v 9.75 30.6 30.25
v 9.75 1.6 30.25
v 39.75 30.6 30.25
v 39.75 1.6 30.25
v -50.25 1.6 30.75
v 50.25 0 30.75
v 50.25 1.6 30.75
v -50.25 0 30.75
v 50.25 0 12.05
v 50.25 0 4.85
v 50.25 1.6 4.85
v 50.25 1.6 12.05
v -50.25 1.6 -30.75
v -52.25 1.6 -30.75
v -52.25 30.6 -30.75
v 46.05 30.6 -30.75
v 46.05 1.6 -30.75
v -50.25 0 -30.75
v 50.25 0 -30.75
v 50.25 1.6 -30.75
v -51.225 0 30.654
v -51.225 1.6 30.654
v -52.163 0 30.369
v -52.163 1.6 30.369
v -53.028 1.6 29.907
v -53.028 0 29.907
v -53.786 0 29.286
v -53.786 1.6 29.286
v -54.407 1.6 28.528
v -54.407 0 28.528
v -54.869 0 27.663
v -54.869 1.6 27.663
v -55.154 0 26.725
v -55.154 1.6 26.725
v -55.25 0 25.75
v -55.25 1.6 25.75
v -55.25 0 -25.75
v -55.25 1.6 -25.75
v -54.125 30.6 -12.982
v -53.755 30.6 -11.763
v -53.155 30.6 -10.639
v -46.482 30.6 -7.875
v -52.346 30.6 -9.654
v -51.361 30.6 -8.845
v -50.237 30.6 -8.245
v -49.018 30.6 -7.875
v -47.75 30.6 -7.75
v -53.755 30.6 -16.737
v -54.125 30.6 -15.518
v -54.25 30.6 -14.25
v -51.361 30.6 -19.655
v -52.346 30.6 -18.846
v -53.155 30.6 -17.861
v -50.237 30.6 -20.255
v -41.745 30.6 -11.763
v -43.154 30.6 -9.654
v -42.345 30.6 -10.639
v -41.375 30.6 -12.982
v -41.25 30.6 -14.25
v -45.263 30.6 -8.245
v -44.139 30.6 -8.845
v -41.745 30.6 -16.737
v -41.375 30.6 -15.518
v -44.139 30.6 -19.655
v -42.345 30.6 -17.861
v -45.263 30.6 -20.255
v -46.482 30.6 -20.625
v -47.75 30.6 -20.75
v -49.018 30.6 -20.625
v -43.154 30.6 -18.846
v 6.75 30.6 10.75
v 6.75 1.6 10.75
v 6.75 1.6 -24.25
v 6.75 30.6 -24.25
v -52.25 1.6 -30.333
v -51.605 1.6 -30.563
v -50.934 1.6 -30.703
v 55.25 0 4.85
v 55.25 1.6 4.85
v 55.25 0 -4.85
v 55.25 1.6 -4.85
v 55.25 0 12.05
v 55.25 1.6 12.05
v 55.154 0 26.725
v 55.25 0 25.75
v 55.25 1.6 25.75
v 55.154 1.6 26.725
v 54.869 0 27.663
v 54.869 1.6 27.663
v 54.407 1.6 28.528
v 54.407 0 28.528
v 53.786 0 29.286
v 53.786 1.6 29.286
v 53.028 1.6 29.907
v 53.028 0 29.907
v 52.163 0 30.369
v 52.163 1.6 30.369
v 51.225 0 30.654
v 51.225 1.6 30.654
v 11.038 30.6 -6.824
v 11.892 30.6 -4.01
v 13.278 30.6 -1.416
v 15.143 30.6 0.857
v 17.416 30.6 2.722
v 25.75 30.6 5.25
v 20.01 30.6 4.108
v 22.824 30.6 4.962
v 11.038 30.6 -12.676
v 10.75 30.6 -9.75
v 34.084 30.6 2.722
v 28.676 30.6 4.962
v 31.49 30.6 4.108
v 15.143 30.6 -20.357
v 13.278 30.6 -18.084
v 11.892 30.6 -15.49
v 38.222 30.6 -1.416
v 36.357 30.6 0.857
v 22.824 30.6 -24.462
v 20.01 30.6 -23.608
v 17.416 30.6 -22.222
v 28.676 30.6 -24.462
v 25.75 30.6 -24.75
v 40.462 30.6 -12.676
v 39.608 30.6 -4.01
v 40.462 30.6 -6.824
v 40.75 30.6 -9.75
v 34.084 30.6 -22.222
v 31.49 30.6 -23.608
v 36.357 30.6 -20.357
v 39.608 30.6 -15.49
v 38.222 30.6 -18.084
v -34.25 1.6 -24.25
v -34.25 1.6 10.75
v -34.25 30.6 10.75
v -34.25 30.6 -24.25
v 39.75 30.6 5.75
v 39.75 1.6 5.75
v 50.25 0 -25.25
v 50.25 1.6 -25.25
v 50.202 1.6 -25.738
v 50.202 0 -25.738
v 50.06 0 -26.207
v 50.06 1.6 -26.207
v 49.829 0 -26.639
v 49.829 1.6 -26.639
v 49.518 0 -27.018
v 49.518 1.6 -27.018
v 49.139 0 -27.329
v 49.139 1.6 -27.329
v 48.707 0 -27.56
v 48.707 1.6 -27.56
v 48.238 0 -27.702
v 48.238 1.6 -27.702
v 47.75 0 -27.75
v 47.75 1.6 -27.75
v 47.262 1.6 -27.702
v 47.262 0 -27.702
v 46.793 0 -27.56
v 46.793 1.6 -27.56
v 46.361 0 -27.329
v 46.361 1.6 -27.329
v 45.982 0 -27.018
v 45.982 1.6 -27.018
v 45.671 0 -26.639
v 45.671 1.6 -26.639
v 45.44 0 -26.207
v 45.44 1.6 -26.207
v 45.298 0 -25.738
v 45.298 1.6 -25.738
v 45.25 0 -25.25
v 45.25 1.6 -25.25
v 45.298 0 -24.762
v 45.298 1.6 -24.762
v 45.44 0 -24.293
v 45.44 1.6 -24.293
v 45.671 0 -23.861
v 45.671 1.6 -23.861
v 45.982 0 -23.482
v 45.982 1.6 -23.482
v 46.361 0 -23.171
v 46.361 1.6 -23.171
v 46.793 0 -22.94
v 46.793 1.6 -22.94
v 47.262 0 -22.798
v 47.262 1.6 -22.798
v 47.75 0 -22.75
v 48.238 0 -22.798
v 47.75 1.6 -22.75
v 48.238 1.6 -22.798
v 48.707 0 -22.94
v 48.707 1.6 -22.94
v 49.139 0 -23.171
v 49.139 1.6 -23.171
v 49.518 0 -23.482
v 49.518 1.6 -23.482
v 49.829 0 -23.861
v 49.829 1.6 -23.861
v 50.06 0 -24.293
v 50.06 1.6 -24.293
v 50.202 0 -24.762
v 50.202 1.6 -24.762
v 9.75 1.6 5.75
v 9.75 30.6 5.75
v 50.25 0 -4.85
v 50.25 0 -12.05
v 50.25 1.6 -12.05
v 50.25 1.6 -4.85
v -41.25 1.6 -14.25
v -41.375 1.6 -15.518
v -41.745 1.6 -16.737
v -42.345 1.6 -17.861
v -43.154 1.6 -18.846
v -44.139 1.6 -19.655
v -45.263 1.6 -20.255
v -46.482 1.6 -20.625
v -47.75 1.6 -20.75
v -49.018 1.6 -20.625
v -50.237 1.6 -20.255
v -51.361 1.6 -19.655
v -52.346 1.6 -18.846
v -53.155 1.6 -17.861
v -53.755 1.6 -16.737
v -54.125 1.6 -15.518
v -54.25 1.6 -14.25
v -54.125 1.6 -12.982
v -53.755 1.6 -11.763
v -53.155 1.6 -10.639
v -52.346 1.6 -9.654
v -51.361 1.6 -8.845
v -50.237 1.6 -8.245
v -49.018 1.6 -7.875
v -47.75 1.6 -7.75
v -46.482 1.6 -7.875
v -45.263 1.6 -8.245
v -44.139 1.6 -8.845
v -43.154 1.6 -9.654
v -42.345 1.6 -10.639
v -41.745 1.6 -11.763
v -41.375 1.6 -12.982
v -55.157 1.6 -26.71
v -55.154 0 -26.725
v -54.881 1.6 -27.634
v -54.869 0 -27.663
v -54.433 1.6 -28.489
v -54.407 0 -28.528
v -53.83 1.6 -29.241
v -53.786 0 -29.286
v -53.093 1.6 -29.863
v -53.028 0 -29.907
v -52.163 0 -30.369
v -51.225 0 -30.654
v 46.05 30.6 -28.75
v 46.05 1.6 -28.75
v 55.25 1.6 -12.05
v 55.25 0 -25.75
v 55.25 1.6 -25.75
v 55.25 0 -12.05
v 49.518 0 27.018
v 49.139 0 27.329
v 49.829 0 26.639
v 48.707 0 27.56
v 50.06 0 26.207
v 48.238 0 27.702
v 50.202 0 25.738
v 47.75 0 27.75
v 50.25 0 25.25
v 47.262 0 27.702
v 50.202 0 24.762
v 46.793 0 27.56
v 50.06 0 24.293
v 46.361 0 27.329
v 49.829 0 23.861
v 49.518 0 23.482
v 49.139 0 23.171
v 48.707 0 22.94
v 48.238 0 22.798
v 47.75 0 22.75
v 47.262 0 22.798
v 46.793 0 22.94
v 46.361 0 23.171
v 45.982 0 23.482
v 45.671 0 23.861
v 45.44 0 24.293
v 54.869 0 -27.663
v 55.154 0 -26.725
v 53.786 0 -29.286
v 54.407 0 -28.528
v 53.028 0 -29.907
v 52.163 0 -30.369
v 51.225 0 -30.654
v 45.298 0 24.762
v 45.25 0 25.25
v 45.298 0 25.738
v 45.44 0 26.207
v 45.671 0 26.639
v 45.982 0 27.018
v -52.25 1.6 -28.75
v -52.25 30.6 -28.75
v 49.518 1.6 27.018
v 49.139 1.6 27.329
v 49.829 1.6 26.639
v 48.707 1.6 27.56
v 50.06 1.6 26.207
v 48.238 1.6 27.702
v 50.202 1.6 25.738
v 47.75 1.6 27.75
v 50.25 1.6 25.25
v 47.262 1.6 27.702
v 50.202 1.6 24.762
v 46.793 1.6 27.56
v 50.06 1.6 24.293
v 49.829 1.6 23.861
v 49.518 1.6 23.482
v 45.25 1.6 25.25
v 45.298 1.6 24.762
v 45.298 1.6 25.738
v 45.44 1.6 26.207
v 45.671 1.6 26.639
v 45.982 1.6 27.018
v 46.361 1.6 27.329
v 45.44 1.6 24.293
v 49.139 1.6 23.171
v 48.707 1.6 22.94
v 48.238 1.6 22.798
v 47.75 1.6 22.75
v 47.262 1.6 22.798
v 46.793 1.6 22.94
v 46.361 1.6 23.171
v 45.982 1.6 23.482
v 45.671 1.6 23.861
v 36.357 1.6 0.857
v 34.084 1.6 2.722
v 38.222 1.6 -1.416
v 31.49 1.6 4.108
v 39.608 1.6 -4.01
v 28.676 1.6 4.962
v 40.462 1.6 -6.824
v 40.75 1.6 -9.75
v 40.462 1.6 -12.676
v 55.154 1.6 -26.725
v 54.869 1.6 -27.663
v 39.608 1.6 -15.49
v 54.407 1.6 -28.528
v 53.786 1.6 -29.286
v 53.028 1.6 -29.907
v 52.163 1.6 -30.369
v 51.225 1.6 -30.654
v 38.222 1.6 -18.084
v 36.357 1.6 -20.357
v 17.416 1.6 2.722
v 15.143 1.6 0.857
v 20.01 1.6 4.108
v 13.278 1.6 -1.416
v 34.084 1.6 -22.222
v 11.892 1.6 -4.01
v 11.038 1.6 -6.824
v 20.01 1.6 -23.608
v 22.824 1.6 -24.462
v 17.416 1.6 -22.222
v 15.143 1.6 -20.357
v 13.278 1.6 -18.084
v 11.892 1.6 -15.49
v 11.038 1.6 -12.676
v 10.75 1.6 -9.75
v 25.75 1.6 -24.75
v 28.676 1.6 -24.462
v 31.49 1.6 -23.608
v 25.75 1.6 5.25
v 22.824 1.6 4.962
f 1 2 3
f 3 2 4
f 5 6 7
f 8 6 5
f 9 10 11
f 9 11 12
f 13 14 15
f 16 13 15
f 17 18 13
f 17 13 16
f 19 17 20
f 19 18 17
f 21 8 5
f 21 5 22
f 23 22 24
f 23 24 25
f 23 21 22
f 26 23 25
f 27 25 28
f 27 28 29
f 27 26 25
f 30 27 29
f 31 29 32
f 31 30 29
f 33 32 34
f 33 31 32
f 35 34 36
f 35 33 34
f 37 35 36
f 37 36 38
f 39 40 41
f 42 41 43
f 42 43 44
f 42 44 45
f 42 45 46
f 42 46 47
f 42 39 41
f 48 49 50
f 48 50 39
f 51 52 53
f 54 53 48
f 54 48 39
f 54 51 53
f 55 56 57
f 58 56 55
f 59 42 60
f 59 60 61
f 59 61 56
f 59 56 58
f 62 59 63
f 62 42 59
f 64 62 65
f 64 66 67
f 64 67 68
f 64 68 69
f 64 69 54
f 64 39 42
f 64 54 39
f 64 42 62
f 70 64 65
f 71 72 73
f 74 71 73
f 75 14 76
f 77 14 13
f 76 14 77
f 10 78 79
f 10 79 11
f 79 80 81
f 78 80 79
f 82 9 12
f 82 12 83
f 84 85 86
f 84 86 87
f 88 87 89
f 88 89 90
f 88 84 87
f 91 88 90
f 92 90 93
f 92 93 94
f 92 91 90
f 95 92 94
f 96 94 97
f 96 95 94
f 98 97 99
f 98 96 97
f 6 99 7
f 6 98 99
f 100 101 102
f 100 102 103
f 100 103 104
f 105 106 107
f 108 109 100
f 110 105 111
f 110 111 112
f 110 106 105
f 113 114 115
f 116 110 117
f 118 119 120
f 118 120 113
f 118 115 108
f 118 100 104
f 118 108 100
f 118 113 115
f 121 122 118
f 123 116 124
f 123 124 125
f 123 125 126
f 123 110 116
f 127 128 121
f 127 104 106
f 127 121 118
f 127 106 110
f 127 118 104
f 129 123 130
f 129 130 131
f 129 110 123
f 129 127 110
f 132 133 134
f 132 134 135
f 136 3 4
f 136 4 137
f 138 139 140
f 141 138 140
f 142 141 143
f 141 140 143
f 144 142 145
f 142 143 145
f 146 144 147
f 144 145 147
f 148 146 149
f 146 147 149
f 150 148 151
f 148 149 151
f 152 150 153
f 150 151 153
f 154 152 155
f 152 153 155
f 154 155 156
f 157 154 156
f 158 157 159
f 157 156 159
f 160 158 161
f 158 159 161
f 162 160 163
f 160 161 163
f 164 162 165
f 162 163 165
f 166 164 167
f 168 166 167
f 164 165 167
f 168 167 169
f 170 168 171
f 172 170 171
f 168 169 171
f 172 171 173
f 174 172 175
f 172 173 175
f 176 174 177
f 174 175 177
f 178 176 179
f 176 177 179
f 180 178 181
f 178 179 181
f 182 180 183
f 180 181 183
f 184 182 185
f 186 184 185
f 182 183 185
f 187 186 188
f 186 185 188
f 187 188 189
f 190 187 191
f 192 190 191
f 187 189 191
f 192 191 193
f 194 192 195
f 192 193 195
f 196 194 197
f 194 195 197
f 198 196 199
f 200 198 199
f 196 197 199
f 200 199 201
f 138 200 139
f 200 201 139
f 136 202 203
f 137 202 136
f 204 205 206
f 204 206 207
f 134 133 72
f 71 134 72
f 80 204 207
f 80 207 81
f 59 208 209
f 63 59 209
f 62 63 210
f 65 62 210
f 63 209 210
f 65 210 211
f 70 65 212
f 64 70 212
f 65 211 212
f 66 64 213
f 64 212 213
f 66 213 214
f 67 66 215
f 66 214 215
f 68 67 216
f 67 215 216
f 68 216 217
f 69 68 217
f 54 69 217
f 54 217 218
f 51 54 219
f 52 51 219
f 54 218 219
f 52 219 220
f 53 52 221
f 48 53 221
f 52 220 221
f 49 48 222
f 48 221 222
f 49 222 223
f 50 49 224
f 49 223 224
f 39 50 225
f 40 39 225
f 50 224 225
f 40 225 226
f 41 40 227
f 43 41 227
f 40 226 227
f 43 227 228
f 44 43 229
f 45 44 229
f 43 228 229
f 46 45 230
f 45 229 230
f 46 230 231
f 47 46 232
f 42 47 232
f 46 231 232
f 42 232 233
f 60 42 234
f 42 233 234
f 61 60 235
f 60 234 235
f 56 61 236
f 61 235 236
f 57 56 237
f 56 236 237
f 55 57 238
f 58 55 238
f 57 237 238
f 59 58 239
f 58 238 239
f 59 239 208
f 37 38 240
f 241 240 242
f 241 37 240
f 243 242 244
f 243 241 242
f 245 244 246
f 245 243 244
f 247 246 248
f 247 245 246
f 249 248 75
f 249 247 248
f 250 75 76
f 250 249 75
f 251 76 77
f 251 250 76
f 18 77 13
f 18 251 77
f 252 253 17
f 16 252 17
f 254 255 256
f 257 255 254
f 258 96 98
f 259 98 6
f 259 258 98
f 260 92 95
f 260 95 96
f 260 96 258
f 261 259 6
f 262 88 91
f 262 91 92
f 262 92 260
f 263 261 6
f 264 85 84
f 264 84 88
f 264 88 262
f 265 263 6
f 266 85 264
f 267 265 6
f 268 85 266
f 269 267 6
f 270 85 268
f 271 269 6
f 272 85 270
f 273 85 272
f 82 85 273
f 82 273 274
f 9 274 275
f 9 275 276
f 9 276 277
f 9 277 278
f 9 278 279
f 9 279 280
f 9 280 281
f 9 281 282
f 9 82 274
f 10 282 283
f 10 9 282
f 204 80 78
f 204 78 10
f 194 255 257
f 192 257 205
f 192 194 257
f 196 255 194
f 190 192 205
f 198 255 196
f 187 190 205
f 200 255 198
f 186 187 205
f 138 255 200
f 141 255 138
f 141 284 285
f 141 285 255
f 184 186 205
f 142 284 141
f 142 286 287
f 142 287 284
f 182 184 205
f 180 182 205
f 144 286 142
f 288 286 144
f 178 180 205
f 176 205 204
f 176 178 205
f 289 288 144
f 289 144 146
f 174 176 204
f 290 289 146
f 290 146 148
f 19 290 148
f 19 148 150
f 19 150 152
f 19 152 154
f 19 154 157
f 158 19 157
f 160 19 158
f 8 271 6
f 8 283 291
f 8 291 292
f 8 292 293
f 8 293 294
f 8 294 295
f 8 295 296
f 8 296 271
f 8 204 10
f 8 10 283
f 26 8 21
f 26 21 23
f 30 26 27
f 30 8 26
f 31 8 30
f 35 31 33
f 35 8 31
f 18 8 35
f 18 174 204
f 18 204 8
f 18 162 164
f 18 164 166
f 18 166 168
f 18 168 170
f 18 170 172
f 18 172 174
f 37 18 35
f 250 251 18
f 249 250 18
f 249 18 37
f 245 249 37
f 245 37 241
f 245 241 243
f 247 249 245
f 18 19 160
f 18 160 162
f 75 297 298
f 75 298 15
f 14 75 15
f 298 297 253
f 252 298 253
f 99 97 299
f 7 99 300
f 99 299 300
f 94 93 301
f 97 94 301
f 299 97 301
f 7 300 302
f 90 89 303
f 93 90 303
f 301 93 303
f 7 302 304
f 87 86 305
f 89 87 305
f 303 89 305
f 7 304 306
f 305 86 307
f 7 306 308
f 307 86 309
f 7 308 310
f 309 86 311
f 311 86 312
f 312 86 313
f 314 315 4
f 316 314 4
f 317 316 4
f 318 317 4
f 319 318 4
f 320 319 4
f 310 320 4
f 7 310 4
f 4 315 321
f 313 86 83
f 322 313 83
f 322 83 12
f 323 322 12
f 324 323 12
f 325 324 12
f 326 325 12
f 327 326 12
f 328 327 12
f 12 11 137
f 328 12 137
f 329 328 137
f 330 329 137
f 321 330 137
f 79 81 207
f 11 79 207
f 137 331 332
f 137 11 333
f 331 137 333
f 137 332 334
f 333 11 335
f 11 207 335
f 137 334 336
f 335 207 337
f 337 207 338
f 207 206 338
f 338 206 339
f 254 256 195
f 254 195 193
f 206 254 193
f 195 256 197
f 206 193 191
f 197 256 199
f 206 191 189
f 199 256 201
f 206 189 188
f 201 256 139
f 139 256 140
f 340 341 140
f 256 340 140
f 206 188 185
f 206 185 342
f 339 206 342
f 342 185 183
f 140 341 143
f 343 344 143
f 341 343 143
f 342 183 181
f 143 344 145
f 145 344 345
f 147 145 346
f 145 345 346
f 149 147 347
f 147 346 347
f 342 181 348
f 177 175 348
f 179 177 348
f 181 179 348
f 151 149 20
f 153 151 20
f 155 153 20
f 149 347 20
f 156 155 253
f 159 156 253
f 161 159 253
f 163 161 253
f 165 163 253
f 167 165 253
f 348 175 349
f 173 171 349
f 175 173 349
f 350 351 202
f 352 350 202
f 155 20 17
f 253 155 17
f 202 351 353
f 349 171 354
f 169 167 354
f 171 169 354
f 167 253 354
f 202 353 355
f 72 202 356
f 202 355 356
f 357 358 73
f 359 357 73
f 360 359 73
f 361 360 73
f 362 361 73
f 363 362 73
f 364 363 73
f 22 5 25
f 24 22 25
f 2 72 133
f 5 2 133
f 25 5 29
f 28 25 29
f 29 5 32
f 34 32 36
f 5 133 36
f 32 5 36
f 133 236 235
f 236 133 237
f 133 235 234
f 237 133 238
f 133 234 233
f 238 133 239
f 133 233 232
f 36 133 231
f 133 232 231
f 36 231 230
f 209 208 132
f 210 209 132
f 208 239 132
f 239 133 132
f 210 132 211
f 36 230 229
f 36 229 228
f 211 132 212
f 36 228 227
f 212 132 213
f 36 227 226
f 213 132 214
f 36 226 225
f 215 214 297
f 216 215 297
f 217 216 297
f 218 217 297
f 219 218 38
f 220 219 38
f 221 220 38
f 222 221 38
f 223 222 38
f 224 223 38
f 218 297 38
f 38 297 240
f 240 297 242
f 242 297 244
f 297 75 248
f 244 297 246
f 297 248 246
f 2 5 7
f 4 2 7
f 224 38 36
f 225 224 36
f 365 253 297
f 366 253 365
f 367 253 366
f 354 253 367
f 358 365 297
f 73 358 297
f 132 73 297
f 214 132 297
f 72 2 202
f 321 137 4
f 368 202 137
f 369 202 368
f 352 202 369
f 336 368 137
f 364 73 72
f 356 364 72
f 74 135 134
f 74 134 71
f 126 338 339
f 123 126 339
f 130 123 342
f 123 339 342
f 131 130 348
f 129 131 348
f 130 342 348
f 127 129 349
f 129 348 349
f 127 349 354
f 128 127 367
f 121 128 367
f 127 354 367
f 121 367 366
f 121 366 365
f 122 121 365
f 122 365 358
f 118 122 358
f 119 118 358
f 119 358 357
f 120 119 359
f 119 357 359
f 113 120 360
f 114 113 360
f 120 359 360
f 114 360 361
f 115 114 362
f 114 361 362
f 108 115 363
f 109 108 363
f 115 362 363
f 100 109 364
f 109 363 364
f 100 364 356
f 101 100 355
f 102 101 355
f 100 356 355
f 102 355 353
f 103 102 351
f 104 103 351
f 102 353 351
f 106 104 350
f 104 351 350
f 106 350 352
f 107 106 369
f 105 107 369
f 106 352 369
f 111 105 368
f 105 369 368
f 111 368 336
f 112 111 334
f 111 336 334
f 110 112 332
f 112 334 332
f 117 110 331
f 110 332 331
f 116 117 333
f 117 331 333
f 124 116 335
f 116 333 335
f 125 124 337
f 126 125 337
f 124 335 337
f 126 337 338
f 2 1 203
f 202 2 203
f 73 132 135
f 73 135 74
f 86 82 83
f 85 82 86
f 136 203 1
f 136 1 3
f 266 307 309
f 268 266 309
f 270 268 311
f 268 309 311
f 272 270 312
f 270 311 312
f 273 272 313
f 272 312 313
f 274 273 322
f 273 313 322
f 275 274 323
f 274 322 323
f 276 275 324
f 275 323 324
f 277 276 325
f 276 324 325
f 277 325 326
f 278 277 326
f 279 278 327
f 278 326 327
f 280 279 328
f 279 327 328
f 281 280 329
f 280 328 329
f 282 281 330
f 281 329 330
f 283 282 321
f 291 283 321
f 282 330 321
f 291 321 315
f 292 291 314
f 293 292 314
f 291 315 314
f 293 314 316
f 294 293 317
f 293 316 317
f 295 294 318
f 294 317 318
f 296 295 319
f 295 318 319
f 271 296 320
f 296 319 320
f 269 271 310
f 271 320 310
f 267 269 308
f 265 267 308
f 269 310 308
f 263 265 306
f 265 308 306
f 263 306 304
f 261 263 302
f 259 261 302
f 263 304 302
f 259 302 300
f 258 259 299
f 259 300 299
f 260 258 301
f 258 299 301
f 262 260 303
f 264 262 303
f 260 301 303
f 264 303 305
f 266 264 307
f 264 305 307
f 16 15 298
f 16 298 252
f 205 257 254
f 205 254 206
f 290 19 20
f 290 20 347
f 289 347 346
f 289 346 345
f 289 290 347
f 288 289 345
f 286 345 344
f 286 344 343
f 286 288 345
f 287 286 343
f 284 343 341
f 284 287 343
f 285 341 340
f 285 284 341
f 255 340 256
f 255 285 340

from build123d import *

# Parameters (mm, degrees)
EXTRUDE_1_DEPTH     = 1.6
SKETCH_2_R          = 2.5
CUT_EXTRUDE_1_DEPTH = 1.6
SKETCH_3_R          = 15
SKETCH_3_R_2        = 6.5
SKETCH_3_W          = 98.3
SKETCH_3_H          = 2
SKETCH_3_W_2        = 30
SKETCH_3_H_2        = 24.5
SKETCH_3_W_3        = 41
SKETCH_3_H_3        = 35
EXTRUDE_2_DEPTH     = 29


with BuildPart() as part:
    # 草图1 → 凸台-拉伸1 (new body)
    with BuildSketch(Plane(origin=(0, 0, 0), x_dir=(1, 0, 0), z_dir=(0, 1, 0))):
        with BuildLine():
            Line((55.25, 12.05), (50.25, 12.05))
            Line((50.25, 12.05), (50.25, 4.85))
            Line((50.25, 4.85), (55.25, 4.85))
            Line((55.25, 4.85), (55.25, -4.85))
            Line((55.25, -4.85), (50.25, -4.85))
            Line((50.25, -4.85), (50.25, -12.05))
            Line((50.25, -12.05), (55.25, -12.05))
            Line((55.25, -12.05), (55.25, -25.75))
            ThreePointArc((55.25, -25.75), (53.785533906, -29.285533906), (50.25, -30.75))
            Line((50.25, -30.75), (-50.25, -30.75))
            ThreePointArc((-50.25, -30.75), (-53.785533906, -29.285533906), (-55.25, -25.75))
            Line((-55.25, -25.75), (-55.25, 25.75))
            ThreePointArc((-55.25, 25.75), (-53.785533906, 29.285533906), (-50.25, 30.75))
            Line((-50.25, 30.75), (50.25, 30.75))
            ThreePointArc((50.25, 30.75), (53.785533906, 29.285533906), (55.25, 25.75))
            Line((55.25, 25.75), (55.25, 12.05))
        make_face()
    extrude(amount=EXTRUDE_1_DEPTH)

    # 草图2 → 切除-拉伸1 (cut)
    with BuildSketch(Plane(origin=(0, 1.6, 0), x_dir=(1, 0, 0), z_dir=(0, 1, 0))):
        with Locations((47.75, 25.25)):
            Circle(SKETCH_2_R)
        with Locations((47.75, -25.25)):
            Circle(SKETCH_2_R)
    extrude(amount=-CUT_EXTRUDE_1_DEPTH, mode=Mode.SUBTRACT)

    # 草图3 → 凸台-拉伸2 (add)
    with BuildSketch(Plane(origin=(0, 1.6, 0), x_dir=(1, 0, 0), z_dir=(0, 1, 0))):
        with Locations((25.75, 9.75)):
            Circle(SKETCH_3_R)
        with Locations((-47.75, 14.25)):
            Circle(SKETCH_3_R_2)
        with Locations((-3.1, 29.75)):
            Rectangle(SKETCH_3_W, SKETCH_3_H)
        with Locations((24.75, -18)):
            Rectangle(SKETCH_3_W_2, SKETCH_3_H_2)
        with Locations((-13.75, 6.75)):
            Rectangle(SKETCH_3_W_3, SKETCH_3_H_3)
    extrude(amount=EXTRUDE_2_DEPTH)


solid = part.part
